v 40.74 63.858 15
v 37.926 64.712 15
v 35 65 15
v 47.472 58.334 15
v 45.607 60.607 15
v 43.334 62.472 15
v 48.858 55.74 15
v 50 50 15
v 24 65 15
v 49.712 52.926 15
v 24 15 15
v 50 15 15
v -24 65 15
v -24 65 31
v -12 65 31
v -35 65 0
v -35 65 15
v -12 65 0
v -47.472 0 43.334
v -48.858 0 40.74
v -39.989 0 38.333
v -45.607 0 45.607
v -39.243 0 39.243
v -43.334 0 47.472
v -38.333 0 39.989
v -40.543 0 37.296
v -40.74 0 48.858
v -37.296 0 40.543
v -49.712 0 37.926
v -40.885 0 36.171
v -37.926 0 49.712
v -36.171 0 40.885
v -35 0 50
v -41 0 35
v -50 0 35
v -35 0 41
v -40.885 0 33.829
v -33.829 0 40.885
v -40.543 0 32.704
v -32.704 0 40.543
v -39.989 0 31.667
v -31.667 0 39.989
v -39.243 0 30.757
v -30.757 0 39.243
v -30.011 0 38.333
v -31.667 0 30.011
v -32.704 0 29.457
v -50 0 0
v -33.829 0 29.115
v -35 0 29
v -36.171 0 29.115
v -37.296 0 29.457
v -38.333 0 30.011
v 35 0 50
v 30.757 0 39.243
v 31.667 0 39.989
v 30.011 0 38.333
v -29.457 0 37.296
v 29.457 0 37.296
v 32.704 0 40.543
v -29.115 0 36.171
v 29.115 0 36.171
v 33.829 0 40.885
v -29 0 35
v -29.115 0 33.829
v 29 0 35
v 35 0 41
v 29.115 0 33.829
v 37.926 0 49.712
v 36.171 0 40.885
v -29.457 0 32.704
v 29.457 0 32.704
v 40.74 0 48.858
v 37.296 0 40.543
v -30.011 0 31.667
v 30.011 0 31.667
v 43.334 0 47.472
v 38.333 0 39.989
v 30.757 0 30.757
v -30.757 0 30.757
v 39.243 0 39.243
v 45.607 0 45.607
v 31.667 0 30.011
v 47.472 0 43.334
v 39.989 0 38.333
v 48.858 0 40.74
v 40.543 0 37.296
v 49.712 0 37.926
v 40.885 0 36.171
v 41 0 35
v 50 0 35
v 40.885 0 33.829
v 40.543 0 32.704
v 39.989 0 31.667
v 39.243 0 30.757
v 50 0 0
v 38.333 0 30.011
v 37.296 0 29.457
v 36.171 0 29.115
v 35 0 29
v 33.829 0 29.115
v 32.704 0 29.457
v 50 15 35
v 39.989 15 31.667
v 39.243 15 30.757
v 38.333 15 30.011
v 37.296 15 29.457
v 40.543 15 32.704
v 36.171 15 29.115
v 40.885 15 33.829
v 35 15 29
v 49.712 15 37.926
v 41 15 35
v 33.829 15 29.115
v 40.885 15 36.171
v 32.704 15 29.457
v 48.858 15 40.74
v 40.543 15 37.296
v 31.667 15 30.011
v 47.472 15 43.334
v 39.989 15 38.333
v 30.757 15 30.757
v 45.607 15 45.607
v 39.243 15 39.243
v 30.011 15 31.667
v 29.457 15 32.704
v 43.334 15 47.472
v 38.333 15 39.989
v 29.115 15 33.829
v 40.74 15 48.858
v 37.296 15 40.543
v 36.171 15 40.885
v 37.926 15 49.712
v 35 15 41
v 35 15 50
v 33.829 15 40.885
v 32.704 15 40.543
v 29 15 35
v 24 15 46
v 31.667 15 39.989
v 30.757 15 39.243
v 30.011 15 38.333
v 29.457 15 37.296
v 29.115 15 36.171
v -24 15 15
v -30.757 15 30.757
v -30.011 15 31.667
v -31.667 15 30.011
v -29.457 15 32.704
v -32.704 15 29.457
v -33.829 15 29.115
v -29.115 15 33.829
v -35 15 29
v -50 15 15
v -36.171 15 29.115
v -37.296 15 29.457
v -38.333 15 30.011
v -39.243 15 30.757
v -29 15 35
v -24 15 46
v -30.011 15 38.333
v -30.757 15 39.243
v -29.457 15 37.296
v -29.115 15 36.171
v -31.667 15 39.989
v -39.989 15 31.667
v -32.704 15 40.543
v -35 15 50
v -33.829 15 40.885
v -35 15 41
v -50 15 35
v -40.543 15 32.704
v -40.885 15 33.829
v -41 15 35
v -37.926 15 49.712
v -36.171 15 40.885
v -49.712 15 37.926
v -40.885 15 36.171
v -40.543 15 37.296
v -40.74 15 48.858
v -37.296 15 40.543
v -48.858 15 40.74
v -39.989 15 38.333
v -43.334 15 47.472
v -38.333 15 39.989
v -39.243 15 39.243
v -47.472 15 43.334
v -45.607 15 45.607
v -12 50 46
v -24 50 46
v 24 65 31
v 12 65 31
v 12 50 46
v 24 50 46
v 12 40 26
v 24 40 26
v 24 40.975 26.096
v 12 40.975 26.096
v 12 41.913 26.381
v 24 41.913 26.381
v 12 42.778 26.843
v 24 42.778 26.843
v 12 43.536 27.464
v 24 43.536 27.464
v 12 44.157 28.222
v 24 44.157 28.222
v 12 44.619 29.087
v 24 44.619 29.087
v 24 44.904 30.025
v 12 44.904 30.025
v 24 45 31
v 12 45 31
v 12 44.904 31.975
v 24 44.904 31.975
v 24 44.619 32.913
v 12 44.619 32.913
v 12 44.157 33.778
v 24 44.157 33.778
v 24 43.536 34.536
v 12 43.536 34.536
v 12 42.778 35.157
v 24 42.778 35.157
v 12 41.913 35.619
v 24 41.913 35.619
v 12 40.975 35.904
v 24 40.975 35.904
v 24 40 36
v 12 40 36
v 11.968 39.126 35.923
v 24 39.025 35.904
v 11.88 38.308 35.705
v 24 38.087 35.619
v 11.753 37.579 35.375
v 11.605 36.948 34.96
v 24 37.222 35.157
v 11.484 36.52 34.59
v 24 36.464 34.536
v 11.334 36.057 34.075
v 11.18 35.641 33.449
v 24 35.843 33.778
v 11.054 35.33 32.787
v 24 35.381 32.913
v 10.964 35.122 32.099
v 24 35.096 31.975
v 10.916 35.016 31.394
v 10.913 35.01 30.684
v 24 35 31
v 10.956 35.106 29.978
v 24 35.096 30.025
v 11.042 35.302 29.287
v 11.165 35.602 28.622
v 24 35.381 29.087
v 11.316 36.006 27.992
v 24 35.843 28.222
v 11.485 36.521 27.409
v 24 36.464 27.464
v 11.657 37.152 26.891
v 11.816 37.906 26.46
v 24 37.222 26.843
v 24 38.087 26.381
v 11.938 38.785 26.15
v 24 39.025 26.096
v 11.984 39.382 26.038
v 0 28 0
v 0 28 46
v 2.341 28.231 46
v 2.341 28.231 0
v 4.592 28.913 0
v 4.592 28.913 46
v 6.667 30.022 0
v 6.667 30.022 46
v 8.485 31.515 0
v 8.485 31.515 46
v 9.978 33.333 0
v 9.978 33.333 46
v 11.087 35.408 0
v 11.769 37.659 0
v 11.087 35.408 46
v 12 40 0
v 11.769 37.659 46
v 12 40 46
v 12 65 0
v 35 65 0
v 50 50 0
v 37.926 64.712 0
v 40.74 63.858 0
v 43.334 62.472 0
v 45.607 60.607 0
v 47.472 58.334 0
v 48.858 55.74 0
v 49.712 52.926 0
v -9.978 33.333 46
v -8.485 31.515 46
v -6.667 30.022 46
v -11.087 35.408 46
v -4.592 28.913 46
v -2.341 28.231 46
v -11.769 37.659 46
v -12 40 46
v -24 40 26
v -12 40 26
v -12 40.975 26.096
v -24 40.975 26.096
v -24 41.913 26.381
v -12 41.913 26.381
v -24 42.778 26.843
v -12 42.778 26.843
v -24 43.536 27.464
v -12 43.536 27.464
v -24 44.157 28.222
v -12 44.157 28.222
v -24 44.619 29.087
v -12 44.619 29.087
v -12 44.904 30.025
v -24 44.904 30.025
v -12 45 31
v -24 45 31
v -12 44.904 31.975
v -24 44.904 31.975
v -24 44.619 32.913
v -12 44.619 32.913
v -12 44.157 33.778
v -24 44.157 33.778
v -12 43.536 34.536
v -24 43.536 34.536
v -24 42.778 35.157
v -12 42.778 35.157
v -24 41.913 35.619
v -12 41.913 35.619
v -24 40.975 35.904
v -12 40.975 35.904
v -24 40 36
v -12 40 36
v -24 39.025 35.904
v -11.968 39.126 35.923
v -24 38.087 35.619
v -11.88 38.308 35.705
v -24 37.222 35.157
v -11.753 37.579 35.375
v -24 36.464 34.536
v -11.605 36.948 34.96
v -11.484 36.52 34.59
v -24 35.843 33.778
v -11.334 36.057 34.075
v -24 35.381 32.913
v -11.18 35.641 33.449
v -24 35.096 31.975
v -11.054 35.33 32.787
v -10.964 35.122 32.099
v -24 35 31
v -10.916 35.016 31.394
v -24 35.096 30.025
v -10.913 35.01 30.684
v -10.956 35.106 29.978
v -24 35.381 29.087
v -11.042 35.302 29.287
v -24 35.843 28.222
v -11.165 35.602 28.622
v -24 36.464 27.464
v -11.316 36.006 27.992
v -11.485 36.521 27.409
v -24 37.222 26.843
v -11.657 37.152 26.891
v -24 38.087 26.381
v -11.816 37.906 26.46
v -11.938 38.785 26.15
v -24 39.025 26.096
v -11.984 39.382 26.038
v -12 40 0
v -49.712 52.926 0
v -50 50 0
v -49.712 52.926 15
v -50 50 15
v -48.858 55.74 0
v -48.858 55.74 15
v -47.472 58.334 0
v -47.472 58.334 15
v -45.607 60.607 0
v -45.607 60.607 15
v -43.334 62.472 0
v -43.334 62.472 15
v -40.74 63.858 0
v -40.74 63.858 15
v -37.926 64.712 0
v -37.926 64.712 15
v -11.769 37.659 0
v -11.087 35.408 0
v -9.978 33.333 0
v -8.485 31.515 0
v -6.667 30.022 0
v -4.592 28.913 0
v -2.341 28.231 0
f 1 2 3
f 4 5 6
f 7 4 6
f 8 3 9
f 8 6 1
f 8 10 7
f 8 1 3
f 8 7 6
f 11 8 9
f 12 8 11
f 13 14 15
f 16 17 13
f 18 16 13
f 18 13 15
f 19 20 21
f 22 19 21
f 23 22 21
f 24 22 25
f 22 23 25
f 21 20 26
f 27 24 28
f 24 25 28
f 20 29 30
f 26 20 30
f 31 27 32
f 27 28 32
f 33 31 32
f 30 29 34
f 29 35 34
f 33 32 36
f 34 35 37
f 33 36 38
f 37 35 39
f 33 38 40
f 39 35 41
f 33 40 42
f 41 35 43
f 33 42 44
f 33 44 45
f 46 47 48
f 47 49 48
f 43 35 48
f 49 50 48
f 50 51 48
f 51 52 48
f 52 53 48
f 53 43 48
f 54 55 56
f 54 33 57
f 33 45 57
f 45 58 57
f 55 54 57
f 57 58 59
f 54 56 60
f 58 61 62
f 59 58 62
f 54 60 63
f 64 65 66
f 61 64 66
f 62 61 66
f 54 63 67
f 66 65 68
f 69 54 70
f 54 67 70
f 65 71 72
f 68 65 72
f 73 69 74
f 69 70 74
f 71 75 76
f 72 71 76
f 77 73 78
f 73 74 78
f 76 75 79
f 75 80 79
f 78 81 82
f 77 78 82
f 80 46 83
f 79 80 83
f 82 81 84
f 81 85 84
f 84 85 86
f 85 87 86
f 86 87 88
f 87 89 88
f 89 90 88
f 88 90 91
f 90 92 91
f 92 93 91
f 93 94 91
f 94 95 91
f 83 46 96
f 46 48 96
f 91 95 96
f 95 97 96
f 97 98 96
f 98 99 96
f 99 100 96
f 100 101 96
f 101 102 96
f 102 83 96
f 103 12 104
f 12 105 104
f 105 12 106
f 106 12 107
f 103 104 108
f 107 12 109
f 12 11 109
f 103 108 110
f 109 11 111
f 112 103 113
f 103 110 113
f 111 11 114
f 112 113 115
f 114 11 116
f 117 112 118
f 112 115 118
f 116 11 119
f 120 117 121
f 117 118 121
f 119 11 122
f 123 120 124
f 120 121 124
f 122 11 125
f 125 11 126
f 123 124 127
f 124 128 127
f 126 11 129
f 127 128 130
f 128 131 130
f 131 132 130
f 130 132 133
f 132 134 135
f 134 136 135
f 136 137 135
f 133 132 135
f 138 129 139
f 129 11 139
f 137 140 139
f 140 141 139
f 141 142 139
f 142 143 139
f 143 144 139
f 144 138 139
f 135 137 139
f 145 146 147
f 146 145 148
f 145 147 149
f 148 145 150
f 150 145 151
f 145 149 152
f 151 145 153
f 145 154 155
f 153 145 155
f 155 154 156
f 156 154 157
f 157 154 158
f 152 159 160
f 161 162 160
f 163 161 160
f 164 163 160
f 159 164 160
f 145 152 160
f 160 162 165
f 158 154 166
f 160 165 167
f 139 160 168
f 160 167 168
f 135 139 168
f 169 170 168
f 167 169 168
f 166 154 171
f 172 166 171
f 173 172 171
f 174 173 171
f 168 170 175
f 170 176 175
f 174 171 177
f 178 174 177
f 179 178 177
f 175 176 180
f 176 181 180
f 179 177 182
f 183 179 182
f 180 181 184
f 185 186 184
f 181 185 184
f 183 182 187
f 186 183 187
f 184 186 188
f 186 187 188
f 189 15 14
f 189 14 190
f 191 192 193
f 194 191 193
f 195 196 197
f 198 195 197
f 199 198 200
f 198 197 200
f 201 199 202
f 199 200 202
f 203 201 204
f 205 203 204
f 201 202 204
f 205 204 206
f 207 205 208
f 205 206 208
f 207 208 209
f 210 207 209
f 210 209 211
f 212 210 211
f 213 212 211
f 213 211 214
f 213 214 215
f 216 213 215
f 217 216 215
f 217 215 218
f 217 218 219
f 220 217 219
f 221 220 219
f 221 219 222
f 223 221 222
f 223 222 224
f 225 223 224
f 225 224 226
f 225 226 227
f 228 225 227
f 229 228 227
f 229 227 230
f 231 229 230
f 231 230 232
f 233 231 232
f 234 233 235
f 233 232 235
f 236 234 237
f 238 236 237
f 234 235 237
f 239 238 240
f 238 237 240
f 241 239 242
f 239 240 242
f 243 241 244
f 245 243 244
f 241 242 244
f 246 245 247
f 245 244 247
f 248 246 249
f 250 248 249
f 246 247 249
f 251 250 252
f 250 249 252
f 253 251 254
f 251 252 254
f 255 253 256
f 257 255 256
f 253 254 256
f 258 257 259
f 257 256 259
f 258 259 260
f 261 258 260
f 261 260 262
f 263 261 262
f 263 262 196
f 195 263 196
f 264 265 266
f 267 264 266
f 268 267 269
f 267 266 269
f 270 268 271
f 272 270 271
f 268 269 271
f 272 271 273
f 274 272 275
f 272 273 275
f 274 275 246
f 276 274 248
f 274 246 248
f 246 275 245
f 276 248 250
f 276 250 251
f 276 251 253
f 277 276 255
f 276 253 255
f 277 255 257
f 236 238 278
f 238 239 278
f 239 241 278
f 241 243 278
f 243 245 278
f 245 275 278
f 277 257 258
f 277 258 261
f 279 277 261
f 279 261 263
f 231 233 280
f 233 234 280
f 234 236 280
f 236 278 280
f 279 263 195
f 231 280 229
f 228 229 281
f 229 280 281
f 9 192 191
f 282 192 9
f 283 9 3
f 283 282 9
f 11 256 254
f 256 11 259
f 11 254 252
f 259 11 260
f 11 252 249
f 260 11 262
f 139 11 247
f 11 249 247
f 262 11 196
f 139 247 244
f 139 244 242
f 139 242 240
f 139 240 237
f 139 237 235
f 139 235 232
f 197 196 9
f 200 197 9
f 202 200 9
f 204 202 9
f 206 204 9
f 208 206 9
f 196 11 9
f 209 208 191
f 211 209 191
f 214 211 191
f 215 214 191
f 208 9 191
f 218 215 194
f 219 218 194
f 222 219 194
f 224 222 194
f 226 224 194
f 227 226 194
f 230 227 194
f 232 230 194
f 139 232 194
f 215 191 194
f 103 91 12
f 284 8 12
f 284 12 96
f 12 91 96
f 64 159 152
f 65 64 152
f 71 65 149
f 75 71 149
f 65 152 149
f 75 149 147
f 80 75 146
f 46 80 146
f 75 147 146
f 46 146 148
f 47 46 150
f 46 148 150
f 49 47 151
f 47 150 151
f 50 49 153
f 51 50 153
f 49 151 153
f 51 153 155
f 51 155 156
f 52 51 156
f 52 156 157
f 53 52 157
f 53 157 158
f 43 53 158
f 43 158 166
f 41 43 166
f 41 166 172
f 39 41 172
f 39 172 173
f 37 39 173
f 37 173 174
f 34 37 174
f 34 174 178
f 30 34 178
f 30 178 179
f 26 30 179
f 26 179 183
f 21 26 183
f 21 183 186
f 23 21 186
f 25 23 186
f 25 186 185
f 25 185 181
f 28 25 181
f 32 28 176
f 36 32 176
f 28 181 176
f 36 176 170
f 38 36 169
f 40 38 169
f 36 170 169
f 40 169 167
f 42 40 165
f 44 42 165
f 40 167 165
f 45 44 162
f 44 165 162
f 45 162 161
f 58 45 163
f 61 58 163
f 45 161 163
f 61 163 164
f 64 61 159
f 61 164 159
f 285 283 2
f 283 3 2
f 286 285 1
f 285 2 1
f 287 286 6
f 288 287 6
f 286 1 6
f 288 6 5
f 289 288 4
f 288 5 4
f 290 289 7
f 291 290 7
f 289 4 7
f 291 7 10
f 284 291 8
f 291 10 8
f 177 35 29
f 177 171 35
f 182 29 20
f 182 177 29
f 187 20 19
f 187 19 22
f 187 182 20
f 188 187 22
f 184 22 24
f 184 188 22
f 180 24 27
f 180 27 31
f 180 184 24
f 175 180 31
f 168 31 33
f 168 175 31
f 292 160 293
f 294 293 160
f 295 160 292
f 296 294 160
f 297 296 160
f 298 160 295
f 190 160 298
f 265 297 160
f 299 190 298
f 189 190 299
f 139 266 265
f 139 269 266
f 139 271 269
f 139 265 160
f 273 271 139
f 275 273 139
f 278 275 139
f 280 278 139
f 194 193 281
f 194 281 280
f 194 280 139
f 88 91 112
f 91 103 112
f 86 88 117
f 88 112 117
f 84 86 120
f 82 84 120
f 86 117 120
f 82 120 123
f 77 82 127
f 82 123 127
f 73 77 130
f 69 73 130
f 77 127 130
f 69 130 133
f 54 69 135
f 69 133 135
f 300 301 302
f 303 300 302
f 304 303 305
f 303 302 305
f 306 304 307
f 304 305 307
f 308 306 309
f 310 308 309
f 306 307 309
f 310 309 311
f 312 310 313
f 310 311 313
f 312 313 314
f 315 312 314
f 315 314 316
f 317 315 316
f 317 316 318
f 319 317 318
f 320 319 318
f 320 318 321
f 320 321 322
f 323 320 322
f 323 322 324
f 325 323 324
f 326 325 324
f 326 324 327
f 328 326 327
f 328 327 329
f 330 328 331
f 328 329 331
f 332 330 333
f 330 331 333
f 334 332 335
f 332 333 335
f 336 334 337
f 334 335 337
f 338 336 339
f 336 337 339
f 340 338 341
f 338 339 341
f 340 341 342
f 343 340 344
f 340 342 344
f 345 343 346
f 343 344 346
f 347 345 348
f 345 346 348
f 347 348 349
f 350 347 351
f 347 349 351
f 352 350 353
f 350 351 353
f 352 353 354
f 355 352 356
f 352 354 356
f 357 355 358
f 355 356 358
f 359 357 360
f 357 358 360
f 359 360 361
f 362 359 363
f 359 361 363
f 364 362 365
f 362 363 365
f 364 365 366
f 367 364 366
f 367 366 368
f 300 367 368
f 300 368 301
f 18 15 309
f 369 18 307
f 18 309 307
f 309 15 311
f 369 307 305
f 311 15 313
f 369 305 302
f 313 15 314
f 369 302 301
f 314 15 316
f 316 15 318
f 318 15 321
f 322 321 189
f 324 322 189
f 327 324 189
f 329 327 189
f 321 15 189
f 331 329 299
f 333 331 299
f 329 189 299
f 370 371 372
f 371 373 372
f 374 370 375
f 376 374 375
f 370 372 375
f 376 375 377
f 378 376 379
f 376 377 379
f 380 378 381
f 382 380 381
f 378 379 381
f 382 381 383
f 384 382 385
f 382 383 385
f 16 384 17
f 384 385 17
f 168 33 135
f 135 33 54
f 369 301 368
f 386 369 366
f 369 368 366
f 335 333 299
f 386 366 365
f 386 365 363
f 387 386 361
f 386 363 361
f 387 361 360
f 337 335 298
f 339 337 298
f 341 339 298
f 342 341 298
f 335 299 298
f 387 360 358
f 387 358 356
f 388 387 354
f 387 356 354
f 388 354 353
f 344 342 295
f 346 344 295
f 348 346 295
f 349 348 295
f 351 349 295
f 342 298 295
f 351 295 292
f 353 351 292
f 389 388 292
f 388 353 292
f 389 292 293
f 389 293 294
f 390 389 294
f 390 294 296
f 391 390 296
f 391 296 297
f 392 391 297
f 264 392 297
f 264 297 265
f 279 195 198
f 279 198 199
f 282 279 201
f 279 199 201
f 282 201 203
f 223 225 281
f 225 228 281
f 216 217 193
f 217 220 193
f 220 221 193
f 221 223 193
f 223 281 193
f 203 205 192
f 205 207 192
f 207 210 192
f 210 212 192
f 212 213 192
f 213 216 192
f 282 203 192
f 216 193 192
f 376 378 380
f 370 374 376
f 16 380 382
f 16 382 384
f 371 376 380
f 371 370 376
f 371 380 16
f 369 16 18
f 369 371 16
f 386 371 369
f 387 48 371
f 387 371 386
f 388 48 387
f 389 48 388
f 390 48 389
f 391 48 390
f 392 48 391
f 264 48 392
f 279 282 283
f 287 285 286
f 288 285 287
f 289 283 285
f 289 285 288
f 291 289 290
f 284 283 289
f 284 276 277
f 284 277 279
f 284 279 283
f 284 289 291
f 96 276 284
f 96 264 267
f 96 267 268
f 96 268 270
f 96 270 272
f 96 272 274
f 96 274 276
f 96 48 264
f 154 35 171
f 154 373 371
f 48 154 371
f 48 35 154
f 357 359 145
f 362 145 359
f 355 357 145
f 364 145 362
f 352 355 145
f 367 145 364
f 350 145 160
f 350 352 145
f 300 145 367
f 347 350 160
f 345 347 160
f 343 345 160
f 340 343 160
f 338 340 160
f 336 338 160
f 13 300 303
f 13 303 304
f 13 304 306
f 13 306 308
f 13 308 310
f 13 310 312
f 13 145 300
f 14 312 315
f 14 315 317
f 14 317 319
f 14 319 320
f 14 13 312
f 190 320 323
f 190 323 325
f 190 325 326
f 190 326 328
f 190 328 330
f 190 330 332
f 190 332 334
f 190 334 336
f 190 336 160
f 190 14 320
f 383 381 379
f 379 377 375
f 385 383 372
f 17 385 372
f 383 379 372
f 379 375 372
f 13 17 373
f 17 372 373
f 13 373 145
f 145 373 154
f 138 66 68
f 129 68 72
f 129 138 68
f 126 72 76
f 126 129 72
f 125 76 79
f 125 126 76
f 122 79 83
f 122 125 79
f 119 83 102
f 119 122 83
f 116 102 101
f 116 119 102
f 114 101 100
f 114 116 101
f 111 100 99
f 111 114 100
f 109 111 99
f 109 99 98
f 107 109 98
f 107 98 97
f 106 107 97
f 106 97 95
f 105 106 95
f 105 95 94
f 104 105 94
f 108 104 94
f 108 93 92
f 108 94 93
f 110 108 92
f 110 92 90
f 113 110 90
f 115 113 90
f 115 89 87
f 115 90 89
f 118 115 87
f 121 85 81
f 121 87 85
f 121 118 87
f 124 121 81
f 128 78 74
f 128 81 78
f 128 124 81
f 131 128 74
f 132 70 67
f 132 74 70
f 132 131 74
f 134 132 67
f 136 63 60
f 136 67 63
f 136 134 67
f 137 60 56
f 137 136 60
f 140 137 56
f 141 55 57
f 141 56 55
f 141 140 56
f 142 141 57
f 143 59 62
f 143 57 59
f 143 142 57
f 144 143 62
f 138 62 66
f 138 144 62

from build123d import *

# Parameters (mm, degrees)
SKETCH1_W           = 100
SKETCH1_H           = 50
BOSS_EXTRUDE1_DEPTH = 15
SKETCH2_W           = 100
SKETCH2_H           = 65
BOSS_EXTRUDE2_DEPTH = 46
CUT_EXTRUDE1_DEPTH  = 47
CUT_EXTRUDE2_DEPTH  = 39
CUT_EXTRUDE3_DEPTH  = 26
FILLET1_R           = 15
SKETCH6_R           = 5
CUT_EXTRUDE4_DEPTH  = 75
SKETCH7_R           = 6
CUT_EXTRUDE5_DEPTH  = 26


with BuildPart() as part:
    # Sketch1 → Boss-Extrude1 (new body)
    with BuildSketch(Plane(origin=(0, 0, 0), x_dir=(1, 0, 0), z_dir=(0, 1, 0))):
        with Locations((0, -25)):
            Rectangle(SKETCH1_W, SKETCH1_H)
    extrude(amount=BOSS_EXTRUDE1_DEPTH)

    # Sketch2 → Boss-Extrude2 (add)
    with BuildSketch(Plane.XY):
        with Locations((0, 32.5)):
            Rectangle(SKETCH2_W, SKETCH2_H)
    extrude(amount=BOSS_EXTRUDE2_DEPTH)

    # Sketch3 → Cut-Extrude1 (cut, through all)
    with BuildSketch(Plane.XY.offset(46)):
        with BuildLine():
            Line((-12, 65), (-12, 40))
            ThreePointArc((-12, 40), (-8.485281374, 31.514718626), (0, 28))
            ThreePointArc((0, 28), (8.485281374, 31.514718626), (12, 40))
            Line((12, 40), (12, 65))
            Line((12, 65), (-12, 65))
        make_face()
    extrude(amount=-CUT_EXTRUDE1_DEPTH, mode=Mode.SUBTRACT)

    # Sketch4 → Cut-Extrude2 (cut, through all)
    with BuildSketch(Plane(origin=(-12, 0, 0), x_dir=(0, 0, -1), z_dir=(1, 0, 0))):
        Polygon((-31, 65), (-46, 50), (-46, 65), align=None)
    cut_extrude2 = extrude(amount=-CUT_EXTRUDE2_DEPTH, mode=Mode.SUBTRACT)

    # Mirror1: Cut-Extrude2 across plane
    add(cut_extrude2.mirror(Plane(origin=(0, 0, 0), x_dir=(0, 0, 1), z_dir=(1, 0, 0))), mode=Mode.SUBTRACT)

    # Sketch5 → Cut-Extrude3 (cut)
    with BuildSketch(Plane.ZY.offset(50)):
        Polygon((15, 65), (15, 15), (46, 15), (46, 50), (31, 65), align=None)
    cut_extrude3 = extrude(amount=-CUT_EXTRUDE3_DEPTH, mode=Mode.SUBTRACT)

    # Mirror2: Cut-Extrude3 across plane
    add(cut_extrude3.mirror(Plane(origin=(0, 0, 0), x_dir=(0, 0, 1), z_dir=(1, 0, 0))), mode=Mode.SUBTRACT)

    # Fillet1
    fillet1_edges = [part.edges().sort_by_distance(p)[0] for p in [
        (-50, 65, 7.5),
        (50, 7.5, 50),
        (-50, 7.5, 50),
        (50, 65, 7.5),
    ]]
    fillet(fillet1_edges, radius=FILLET1_R)

    # Sketch6 → Cut-Extrude4 (cut, through all)
    with BuildSketch(Plane(origin=(24, 0, 0), x_dir=(0, 0, -1), z_dir=(1, 0, 0))):
        with Locations((-31, 40)):
            Circle(SKETCH6_R)
    extrude(amount=-CUT_EXTRUDE4_DEPTH, mode=Mode.SUBTRACT)

    # Sketch7 → Cut-Extrude5 (cut)
    with BuildSketch(Plane(origin=(0, 15, 0), x_dir=(1, 0, 0), z_dir=(0, 1, 0))):
        with Locations((-35, -35)):
            Circle(SKETCH7_R)
    cut_extrude5 = extrude(amount=-CUT_EXTRUDE5_DEPTH, mode=Mode.SUBTRACT)

    # Mirror3: Cut-Extrude5 across plane
    add(cut_extrude5.mirror(Plane(origin=(0, 0, 0), x_dir=(0, 0, 1), z_dir=(1, 0, 0))), mode=Mode.SUBTRACT)


solid = part.part
